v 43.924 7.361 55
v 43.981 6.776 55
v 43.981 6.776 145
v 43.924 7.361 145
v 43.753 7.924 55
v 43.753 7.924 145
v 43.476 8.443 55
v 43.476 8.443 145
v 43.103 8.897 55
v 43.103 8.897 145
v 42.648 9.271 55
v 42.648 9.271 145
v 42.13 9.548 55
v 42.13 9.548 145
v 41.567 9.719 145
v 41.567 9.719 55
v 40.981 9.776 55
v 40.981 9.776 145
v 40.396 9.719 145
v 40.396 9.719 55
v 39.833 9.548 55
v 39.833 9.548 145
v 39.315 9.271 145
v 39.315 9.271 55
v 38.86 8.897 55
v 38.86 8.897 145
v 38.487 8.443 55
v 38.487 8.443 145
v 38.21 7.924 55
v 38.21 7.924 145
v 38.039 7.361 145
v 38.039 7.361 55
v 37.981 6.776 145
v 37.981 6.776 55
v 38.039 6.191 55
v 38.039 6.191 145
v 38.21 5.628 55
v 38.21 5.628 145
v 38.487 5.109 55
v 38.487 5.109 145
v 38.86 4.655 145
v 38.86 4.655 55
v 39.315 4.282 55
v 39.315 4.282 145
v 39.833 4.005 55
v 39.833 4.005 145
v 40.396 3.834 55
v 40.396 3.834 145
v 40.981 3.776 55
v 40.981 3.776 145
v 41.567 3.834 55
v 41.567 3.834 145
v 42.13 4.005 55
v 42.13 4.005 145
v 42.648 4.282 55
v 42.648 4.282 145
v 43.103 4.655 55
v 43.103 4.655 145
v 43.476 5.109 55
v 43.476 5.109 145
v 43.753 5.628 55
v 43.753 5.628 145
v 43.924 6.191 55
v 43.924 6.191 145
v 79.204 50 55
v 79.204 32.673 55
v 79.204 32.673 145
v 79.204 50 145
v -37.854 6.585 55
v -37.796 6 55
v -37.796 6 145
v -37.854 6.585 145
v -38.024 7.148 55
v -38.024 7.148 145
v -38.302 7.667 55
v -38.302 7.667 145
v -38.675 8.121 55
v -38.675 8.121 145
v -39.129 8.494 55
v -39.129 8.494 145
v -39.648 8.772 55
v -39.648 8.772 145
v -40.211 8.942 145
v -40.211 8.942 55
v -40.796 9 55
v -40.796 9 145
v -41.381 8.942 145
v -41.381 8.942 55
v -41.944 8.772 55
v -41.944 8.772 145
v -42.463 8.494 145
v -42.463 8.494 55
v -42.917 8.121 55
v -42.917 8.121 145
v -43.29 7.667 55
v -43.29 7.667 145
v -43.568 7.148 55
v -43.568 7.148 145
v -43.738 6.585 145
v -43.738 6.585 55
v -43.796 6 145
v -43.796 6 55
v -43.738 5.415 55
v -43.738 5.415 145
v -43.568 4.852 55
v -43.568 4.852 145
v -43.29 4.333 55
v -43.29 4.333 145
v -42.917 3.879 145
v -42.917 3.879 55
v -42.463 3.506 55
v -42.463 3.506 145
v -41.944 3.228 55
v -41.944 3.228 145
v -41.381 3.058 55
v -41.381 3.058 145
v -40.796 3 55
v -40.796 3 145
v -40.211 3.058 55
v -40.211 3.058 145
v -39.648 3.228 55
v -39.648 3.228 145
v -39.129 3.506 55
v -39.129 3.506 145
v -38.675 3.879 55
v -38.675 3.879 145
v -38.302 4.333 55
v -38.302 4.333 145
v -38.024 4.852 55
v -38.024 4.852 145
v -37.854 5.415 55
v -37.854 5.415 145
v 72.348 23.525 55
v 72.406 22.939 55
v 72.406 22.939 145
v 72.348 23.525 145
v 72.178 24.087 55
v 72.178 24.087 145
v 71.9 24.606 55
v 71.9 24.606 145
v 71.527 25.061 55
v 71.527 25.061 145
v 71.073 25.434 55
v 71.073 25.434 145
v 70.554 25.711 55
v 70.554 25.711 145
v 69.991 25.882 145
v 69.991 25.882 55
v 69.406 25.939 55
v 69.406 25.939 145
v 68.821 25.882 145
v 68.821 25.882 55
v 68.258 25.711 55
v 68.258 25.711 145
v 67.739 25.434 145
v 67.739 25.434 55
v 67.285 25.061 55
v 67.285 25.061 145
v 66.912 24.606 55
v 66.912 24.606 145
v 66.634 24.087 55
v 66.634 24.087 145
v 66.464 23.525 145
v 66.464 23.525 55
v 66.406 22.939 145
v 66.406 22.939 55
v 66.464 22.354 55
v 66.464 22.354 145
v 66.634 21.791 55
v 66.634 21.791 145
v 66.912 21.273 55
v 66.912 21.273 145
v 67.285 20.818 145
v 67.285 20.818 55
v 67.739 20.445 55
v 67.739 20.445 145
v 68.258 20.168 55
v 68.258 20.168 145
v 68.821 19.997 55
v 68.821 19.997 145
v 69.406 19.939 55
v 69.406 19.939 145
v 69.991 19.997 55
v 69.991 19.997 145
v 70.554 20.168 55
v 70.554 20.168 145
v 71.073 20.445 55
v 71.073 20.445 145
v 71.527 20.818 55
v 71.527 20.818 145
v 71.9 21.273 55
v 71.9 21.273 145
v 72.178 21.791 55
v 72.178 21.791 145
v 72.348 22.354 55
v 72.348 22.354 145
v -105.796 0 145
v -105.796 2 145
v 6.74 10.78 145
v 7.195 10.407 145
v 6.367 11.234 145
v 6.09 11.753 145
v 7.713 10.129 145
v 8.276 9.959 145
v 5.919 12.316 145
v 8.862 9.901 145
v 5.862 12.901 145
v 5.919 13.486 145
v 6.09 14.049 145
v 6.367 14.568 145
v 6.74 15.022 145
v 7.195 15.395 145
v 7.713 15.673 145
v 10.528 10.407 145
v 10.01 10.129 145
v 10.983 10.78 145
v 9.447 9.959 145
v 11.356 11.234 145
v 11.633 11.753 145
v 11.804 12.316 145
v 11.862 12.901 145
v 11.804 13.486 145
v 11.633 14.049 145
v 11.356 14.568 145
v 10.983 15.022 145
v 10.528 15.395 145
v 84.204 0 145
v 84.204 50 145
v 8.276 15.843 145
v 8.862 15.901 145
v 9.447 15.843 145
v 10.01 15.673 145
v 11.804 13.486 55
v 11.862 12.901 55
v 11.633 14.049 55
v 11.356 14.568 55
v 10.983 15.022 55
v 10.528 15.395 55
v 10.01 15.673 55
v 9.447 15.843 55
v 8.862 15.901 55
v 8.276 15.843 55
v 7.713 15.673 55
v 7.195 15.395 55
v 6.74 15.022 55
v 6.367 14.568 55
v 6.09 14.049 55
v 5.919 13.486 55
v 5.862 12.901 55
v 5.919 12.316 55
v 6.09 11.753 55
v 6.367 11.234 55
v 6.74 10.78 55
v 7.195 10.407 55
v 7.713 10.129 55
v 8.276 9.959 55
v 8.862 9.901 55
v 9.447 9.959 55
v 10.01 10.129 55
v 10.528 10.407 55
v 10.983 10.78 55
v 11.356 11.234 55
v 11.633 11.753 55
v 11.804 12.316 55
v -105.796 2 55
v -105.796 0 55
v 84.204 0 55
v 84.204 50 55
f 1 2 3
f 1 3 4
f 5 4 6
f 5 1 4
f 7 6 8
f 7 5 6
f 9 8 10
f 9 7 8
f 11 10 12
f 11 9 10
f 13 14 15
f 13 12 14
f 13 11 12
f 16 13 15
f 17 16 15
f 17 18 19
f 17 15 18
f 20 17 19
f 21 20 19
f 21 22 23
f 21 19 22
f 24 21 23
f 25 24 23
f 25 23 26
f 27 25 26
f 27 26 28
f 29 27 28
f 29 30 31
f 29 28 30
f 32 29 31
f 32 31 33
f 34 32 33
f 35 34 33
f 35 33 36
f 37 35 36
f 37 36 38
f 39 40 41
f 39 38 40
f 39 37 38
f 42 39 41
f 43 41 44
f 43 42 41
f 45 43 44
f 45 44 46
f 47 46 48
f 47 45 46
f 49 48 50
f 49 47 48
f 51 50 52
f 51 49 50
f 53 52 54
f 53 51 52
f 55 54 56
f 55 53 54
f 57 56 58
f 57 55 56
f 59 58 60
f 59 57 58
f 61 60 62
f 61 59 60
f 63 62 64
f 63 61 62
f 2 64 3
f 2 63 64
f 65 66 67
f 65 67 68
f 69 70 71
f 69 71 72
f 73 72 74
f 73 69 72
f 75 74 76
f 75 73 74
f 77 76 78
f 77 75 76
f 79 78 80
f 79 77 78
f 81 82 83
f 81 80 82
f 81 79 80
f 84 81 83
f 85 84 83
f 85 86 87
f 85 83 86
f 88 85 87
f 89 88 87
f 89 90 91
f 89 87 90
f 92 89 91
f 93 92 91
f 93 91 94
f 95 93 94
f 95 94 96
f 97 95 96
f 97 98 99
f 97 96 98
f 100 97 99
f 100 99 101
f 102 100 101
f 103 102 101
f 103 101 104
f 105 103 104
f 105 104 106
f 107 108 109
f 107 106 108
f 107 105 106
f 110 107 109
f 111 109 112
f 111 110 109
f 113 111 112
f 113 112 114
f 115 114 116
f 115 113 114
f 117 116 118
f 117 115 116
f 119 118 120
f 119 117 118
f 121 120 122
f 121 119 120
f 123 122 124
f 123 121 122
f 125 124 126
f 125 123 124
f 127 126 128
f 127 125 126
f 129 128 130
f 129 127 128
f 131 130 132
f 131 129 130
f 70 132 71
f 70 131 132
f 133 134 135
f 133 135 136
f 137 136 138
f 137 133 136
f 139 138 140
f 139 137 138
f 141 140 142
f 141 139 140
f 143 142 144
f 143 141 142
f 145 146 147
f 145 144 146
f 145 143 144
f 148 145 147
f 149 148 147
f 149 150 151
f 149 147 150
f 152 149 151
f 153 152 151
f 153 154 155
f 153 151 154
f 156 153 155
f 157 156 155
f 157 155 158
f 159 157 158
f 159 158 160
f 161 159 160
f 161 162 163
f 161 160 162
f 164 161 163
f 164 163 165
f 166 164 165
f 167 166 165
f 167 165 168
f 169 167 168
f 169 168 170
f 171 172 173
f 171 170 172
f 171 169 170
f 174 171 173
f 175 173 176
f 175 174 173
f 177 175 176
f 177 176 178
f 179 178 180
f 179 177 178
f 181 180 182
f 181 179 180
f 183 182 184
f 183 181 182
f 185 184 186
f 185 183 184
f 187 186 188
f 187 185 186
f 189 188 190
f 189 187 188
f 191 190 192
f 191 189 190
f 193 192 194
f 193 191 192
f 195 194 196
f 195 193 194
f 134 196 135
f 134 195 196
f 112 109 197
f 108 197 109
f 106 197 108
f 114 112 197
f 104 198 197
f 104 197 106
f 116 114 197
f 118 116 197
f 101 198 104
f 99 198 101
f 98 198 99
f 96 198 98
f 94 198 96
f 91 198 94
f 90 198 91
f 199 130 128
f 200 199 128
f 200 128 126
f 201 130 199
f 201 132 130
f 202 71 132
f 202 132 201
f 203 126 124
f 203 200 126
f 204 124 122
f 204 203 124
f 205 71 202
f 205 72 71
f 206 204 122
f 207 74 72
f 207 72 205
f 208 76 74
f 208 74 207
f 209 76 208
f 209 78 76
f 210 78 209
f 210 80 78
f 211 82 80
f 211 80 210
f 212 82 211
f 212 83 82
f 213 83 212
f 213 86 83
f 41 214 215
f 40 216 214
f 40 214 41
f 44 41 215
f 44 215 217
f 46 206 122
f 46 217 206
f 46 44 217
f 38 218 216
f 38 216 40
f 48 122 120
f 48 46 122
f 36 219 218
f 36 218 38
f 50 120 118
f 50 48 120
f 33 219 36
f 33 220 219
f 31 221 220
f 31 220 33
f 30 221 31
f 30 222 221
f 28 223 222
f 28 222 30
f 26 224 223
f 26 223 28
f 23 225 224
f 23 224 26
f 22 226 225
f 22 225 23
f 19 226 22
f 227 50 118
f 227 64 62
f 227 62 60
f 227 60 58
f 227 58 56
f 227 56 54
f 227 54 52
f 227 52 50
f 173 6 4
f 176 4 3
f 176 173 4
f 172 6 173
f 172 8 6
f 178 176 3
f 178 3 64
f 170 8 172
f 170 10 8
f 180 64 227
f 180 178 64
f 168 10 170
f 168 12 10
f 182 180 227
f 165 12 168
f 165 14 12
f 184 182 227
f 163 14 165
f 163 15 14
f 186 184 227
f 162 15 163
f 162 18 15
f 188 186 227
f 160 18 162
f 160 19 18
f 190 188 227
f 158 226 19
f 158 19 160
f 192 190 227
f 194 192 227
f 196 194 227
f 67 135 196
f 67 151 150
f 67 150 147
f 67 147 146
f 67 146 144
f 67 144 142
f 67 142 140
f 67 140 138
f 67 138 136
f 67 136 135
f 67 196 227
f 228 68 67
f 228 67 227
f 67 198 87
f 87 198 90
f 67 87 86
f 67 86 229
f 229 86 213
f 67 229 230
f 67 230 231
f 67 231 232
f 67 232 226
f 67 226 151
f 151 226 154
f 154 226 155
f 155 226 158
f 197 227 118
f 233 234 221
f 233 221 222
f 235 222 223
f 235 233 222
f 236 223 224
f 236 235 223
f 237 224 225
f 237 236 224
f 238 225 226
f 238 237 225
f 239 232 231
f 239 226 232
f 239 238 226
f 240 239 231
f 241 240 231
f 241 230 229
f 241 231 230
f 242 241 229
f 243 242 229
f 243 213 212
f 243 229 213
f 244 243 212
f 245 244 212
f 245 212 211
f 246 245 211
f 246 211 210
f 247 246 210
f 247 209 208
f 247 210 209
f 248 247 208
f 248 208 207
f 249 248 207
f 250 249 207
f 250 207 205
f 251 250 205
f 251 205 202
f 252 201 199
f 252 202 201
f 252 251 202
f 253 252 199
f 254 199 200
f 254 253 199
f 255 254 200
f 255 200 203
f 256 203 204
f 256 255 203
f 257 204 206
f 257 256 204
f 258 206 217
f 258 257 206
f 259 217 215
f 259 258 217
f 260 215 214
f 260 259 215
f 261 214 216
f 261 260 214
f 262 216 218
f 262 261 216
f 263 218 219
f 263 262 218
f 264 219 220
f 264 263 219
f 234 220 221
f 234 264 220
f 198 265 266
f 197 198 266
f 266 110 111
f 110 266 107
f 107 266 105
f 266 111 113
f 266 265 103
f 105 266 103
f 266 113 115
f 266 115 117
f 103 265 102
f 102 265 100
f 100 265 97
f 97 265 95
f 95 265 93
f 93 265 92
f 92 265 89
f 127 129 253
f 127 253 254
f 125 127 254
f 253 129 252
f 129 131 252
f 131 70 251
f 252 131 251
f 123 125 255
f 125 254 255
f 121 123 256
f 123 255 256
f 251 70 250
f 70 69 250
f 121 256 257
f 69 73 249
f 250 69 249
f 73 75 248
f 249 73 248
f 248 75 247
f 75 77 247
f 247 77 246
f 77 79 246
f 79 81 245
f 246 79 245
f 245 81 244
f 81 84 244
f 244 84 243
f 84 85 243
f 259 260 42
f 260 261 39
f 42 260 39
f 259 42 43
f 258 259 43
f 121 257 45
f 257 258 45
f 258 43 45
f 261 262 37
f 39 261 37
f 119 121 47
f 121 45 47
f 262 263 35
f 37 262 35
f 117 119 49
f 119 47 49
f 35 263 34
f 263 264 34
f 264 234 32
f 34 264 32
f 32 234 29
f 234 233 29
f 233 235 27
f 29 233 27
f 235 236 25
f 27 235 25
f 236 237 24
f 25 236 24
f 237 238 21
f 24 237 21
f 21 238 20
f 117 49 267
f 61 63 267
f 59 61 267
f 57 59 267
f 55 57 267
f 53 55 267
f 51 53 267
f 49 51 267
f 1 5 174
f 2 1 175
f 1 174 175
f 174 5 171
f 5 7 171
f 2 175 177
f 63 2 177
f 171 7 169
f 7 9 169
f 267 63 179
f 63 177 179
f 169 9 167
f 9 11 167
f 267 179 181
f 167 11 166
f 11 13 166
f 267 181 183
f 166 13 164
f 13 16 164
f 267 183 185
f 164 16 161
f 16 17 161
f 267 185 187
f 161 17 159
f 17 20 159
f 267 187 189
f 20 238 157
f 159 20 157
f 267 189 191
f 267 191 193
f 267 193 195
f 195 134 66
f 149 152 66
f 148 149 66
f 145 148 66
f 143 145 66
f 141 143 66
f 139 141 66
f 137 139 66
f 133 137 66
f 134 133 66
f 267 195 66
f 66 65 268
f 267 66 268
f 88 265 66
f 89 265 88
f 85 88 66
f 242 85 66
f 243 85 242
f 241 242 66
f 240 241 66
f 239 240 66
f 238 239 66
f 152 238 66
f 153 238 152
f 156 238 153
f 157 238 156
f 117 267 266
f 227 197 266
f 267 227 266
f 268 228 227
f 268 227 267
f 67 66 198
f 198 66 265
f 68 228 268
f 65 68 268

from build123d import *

# Parameters (mm, degrees)
ESQUISSE1_R             = 3
BOSS_EXTRU_1_DEPTH      = 200
ESQUISSE4_W             = 5
ESQUISSE4_H             = 50
BOSS_EXTRU_4_DEPTH      = 180
BOSS_EXTRU_7_DEPTH      = 50
ESQUISSE6_W             = 20
ESQUISSE6_H             = 10.719834163
ENL_V_MAT_EXTRU_2_DEPTH = 10
ESQUISSE5_W             = 10
ESQUISSE5_H             = 10
ENL_V_MAT_EXTRU_1_DEPTH = 10
ESQUISSE14_R            = 5
ENL_V_MAT_EXTRU_4_DEPTH = 15
BOSS_EXTRU_8_REACH      = 242.401
ENL_V_MAT_EXTRU_5_REACH = 238.046
ESQUISSE16_W            = 190
ESQUISSE16_H            = 60


with BuildPart() as part:
    # Esquisse1 → Boss.-Extru.1 (new body)
    with BuildSketch(Plane.XY):
        Polygon((-105.796013405, 0), (84.203986595, 0), (84.203986595, 33.502126335), (-105.796013405, 2), align=None)
        with Locations((69.406004871, 22.939397164)):
            Circle(ESQUISSE1_R, mode=Mode.SUBTRACT)
        with Locations((40.981469067, 6.77616521)):
            Circle(ESQUISSE1_R, mode=Mode.SUBTRACT)
        with Locations((-40.796013405, 6)):
            Circle(ESQUISSE1_R, mode=Mode.SUBTRACT)
        with Locations((8.861542866, 12.901085106)):
            Circle(ESQUISSE1_R, mode=Mode.SUBTRACT)
    extrude(amount=BOSS_EXTRU_1_DEPTH)

    # Esquisse4 → Boss.-Extru.4 (add)
    with BuildSketch(Plane(origin=(84.203986595, 0, 0), x_dir=(0, 0, -1), z_dir=(1, 0, 0))):
        with Locations((-202.5, 25)):
            Rectangle(ESQUISSE4_W, ESQUISSE4_H)
        with Locations((2.5, 25)):
            Rectangle(ESQUISSE4_W, ESQUISSE4_H)
    extrude(amount=-BOSS_EXTRU_4_DEPTH)

    # Esquisse8 → Boss.-Extru.7 (add)
    with BuildSketch(Plane(origin=(0, 50, 0), x_dir=(1, 0, 0), z_dir=(0, 1, 0))):
        Polygon((84.203986595, 0), (-95.796013405, 0), (-95.796013405, -5), align=None)
    boss_extru_7 = extrude(amount=-BOSS_EXTRU_7_DEPTH)

    # Esquisse6 → Enlèv. mat.-Extru.2 (cut)
    with BuildSketch(Plane(origin=(0, 0, -5), x_dir=(-1, 0, 0), z_dir=(0, 0, -1))):
        with Locations((95.796013405, 5.359917081)):
            Rectangle(ESQUISSE6_W, ESQUISSE6_H)
    enl_v_mat_extru_2 = extrude(amount=-ENL_V_MAT_EXTRU_2_DEPTH, mode=Mode.SUBTRACT)

    # Esquisse5 → Enlèv. mat.-Extru.1 (cut)
    with BuildSketch(Plane(origin=(84.203986595, 0, 0), x_dir=(0, 0, -1), z_dir=(1, 0, 0))):
        with Locations((-200, 5)):
            Rectangle(ESQUISSE5_W, ESQUISSE5_H)
        with Locations((0, 5)):
            Rectangle(ESQUISSE5_W, ESQUISSE5_H)
    extrude(amount=-ENL_V_MAT_EXTRU_1_DEPTH, mode=Mode.SUBTRACT)

    # Esquisse14 → Enlèv. mat.-Extru.4 (cut)
    with BuildSketch(Plane(origin=(0, 0, -5), x_dir=(-1, 0, 0), z_dir=(0, 0, -1))):
        with Locations((-69.406004871, 22.939397164)):
            Circle(ESQUISSE14_R)
        with Locations((-40.981469067, 6.77616521)):
            Circle(ESQUISSE14_R)
        with Locations((-8.861542866, 12.901085106)):
            Circle(ESQUISSE14_R)
        with Locations((40.796013405, 6)):
            Circle(ESQUISSE14_R)
    enl_v_mat_extru_4 = extrude(amount=-ENL_V_MAT_EXTRU_4_DEPTH, mode=Mode.SUBTRACT)

    # Symétrie3: Boss.-Extru.7, Enlèv. mat.-Extru.2, Enlèv. mat.-Extru.4 across plane
    add(boss_extru_7.mirror(Plane(origin=(0, 0, 100), x_dir=(1, 0, 0), z_dir=(0, 0, -1))))
    add(enl_v_mat_extru_2.mirror(Plane(origin=(0, 0, 100), x_dir=(1, 0, 0), z_dir=(0, 0, -1))), mode=Mode.SUBTRACT)
    add(enl_v_mat_extru_4.mirror(Plane(origin=(0, 0, 100), x_dir=(1, 0, 0), z_dir=(0, 0, -1))), mode=Mode.SUBTRACT)

    # Boss.-Extru.8: up to this plane
    boss_extru_8_end = Plane(origin=(-95.796013405, -180.069431054, 195), z_dir=(-0.0277670672403533, 0, 0.9996144206527183))
    # Esquisse15 → Boss.-Extru.8 (add, up to the surface)
    with BuildSketch(Plane(origin=(0, 0, -5), x_dir=(-1, 0, 0), z_dir=(0, 0, -1)), mode=Mode.PRIVATE) as boss_extru_8_sk1:
        Polygon((-84.203986595, 33.502126335), (-79.203986595, 32.67312301), (-79.203986595, 50), (-84.203986595, 50), align=None)
    boss_extru_8_tool1 = split(extrude(boss_extru_8_sk1.sketch, amount=-BOSS_EXTRU_8_REACH, mode=Mode.PRIVATE), bisect_by=boss_extru_8_end, keep=Keep.BOTH, mode=Mode.PRIVATE)
    add(boss_extru_8_tool1.solids().sort_by_distance((81.683563, 41.542119, -5))[0])

    # Enlèv. mat.-Extru.5: up to this face of the body (flat: up to its plane)
    enl_v_mat_extru_5_end = Plane(part.part.faces().sort_by_distance((-10.38578146, 0, 100.003530671))[0])
    # Esquisse16 → Enlèv. mat.-Extru.5 (cut, up to the picked face)
    with BuildSketch(Plane(origin=(0, 50, 0), x_dir=(1, 0, 0), z_dir=(0, 1, 0)), mode=Mode.PRIVATE) as enl_v_mat_extru_5_sk1:
        with Locations((-10.796013405, -175)):
            Rectangle(ESQUISSE16_W, ESQUISSE16_H)
    enl_v_mat_extru_5_tool1 = split(extrude(enl_v_mat_extru_5_sk1.sketch, amount=-ENL_V_MAT_EXTRU_5_REACH, mode=Mode.PRIVATE), bisect_by=enl_v_mat_extru_5_end, keep=Keep.BOTH, mode=Mode.PRIVATE)
    # Esquisse16 → Enlèv. mat.-Extru.5 (cut, up to the picked face)
    with BuildSketch(Plane(origin=(0, 50, 0), x_dir=(1, 0, 0), z_dir=(0, 1, 0)), mode=Mode.PRIVATE) as enl_v_mat_extru_5_sk2:
        with Locations((-10.796013405, -25)):
            Rectangle(ESQUISSE16_W, ESQUISSE16_H)
    enl_v_mat_extru_5_tool2 = split(extrude(enl_v_mat_extru_5_sk2.sketch, amount=-ENL_V_MAT_EXTRU_5_REACH, mode=Mode.PRIVATE), bisect_by=enl_v_mat_extru_5_end, keep=Keep.BOTH, mode=Mode.PRIVATE)
    add(enl_v_mat_extru_5_tool1.solids().sort_by(Axis((-10.796013, 50, 175), (0, -1, 0)))[0], mode=Mode.SUBTRACT)
    add(enl_v_mat_extru_5_tool2.solids().sort_by(Axis((-10.796013, 50, 25), (0, -1, 0)))[0], mode=Mode.SUBTRACT)


solid = part.part
